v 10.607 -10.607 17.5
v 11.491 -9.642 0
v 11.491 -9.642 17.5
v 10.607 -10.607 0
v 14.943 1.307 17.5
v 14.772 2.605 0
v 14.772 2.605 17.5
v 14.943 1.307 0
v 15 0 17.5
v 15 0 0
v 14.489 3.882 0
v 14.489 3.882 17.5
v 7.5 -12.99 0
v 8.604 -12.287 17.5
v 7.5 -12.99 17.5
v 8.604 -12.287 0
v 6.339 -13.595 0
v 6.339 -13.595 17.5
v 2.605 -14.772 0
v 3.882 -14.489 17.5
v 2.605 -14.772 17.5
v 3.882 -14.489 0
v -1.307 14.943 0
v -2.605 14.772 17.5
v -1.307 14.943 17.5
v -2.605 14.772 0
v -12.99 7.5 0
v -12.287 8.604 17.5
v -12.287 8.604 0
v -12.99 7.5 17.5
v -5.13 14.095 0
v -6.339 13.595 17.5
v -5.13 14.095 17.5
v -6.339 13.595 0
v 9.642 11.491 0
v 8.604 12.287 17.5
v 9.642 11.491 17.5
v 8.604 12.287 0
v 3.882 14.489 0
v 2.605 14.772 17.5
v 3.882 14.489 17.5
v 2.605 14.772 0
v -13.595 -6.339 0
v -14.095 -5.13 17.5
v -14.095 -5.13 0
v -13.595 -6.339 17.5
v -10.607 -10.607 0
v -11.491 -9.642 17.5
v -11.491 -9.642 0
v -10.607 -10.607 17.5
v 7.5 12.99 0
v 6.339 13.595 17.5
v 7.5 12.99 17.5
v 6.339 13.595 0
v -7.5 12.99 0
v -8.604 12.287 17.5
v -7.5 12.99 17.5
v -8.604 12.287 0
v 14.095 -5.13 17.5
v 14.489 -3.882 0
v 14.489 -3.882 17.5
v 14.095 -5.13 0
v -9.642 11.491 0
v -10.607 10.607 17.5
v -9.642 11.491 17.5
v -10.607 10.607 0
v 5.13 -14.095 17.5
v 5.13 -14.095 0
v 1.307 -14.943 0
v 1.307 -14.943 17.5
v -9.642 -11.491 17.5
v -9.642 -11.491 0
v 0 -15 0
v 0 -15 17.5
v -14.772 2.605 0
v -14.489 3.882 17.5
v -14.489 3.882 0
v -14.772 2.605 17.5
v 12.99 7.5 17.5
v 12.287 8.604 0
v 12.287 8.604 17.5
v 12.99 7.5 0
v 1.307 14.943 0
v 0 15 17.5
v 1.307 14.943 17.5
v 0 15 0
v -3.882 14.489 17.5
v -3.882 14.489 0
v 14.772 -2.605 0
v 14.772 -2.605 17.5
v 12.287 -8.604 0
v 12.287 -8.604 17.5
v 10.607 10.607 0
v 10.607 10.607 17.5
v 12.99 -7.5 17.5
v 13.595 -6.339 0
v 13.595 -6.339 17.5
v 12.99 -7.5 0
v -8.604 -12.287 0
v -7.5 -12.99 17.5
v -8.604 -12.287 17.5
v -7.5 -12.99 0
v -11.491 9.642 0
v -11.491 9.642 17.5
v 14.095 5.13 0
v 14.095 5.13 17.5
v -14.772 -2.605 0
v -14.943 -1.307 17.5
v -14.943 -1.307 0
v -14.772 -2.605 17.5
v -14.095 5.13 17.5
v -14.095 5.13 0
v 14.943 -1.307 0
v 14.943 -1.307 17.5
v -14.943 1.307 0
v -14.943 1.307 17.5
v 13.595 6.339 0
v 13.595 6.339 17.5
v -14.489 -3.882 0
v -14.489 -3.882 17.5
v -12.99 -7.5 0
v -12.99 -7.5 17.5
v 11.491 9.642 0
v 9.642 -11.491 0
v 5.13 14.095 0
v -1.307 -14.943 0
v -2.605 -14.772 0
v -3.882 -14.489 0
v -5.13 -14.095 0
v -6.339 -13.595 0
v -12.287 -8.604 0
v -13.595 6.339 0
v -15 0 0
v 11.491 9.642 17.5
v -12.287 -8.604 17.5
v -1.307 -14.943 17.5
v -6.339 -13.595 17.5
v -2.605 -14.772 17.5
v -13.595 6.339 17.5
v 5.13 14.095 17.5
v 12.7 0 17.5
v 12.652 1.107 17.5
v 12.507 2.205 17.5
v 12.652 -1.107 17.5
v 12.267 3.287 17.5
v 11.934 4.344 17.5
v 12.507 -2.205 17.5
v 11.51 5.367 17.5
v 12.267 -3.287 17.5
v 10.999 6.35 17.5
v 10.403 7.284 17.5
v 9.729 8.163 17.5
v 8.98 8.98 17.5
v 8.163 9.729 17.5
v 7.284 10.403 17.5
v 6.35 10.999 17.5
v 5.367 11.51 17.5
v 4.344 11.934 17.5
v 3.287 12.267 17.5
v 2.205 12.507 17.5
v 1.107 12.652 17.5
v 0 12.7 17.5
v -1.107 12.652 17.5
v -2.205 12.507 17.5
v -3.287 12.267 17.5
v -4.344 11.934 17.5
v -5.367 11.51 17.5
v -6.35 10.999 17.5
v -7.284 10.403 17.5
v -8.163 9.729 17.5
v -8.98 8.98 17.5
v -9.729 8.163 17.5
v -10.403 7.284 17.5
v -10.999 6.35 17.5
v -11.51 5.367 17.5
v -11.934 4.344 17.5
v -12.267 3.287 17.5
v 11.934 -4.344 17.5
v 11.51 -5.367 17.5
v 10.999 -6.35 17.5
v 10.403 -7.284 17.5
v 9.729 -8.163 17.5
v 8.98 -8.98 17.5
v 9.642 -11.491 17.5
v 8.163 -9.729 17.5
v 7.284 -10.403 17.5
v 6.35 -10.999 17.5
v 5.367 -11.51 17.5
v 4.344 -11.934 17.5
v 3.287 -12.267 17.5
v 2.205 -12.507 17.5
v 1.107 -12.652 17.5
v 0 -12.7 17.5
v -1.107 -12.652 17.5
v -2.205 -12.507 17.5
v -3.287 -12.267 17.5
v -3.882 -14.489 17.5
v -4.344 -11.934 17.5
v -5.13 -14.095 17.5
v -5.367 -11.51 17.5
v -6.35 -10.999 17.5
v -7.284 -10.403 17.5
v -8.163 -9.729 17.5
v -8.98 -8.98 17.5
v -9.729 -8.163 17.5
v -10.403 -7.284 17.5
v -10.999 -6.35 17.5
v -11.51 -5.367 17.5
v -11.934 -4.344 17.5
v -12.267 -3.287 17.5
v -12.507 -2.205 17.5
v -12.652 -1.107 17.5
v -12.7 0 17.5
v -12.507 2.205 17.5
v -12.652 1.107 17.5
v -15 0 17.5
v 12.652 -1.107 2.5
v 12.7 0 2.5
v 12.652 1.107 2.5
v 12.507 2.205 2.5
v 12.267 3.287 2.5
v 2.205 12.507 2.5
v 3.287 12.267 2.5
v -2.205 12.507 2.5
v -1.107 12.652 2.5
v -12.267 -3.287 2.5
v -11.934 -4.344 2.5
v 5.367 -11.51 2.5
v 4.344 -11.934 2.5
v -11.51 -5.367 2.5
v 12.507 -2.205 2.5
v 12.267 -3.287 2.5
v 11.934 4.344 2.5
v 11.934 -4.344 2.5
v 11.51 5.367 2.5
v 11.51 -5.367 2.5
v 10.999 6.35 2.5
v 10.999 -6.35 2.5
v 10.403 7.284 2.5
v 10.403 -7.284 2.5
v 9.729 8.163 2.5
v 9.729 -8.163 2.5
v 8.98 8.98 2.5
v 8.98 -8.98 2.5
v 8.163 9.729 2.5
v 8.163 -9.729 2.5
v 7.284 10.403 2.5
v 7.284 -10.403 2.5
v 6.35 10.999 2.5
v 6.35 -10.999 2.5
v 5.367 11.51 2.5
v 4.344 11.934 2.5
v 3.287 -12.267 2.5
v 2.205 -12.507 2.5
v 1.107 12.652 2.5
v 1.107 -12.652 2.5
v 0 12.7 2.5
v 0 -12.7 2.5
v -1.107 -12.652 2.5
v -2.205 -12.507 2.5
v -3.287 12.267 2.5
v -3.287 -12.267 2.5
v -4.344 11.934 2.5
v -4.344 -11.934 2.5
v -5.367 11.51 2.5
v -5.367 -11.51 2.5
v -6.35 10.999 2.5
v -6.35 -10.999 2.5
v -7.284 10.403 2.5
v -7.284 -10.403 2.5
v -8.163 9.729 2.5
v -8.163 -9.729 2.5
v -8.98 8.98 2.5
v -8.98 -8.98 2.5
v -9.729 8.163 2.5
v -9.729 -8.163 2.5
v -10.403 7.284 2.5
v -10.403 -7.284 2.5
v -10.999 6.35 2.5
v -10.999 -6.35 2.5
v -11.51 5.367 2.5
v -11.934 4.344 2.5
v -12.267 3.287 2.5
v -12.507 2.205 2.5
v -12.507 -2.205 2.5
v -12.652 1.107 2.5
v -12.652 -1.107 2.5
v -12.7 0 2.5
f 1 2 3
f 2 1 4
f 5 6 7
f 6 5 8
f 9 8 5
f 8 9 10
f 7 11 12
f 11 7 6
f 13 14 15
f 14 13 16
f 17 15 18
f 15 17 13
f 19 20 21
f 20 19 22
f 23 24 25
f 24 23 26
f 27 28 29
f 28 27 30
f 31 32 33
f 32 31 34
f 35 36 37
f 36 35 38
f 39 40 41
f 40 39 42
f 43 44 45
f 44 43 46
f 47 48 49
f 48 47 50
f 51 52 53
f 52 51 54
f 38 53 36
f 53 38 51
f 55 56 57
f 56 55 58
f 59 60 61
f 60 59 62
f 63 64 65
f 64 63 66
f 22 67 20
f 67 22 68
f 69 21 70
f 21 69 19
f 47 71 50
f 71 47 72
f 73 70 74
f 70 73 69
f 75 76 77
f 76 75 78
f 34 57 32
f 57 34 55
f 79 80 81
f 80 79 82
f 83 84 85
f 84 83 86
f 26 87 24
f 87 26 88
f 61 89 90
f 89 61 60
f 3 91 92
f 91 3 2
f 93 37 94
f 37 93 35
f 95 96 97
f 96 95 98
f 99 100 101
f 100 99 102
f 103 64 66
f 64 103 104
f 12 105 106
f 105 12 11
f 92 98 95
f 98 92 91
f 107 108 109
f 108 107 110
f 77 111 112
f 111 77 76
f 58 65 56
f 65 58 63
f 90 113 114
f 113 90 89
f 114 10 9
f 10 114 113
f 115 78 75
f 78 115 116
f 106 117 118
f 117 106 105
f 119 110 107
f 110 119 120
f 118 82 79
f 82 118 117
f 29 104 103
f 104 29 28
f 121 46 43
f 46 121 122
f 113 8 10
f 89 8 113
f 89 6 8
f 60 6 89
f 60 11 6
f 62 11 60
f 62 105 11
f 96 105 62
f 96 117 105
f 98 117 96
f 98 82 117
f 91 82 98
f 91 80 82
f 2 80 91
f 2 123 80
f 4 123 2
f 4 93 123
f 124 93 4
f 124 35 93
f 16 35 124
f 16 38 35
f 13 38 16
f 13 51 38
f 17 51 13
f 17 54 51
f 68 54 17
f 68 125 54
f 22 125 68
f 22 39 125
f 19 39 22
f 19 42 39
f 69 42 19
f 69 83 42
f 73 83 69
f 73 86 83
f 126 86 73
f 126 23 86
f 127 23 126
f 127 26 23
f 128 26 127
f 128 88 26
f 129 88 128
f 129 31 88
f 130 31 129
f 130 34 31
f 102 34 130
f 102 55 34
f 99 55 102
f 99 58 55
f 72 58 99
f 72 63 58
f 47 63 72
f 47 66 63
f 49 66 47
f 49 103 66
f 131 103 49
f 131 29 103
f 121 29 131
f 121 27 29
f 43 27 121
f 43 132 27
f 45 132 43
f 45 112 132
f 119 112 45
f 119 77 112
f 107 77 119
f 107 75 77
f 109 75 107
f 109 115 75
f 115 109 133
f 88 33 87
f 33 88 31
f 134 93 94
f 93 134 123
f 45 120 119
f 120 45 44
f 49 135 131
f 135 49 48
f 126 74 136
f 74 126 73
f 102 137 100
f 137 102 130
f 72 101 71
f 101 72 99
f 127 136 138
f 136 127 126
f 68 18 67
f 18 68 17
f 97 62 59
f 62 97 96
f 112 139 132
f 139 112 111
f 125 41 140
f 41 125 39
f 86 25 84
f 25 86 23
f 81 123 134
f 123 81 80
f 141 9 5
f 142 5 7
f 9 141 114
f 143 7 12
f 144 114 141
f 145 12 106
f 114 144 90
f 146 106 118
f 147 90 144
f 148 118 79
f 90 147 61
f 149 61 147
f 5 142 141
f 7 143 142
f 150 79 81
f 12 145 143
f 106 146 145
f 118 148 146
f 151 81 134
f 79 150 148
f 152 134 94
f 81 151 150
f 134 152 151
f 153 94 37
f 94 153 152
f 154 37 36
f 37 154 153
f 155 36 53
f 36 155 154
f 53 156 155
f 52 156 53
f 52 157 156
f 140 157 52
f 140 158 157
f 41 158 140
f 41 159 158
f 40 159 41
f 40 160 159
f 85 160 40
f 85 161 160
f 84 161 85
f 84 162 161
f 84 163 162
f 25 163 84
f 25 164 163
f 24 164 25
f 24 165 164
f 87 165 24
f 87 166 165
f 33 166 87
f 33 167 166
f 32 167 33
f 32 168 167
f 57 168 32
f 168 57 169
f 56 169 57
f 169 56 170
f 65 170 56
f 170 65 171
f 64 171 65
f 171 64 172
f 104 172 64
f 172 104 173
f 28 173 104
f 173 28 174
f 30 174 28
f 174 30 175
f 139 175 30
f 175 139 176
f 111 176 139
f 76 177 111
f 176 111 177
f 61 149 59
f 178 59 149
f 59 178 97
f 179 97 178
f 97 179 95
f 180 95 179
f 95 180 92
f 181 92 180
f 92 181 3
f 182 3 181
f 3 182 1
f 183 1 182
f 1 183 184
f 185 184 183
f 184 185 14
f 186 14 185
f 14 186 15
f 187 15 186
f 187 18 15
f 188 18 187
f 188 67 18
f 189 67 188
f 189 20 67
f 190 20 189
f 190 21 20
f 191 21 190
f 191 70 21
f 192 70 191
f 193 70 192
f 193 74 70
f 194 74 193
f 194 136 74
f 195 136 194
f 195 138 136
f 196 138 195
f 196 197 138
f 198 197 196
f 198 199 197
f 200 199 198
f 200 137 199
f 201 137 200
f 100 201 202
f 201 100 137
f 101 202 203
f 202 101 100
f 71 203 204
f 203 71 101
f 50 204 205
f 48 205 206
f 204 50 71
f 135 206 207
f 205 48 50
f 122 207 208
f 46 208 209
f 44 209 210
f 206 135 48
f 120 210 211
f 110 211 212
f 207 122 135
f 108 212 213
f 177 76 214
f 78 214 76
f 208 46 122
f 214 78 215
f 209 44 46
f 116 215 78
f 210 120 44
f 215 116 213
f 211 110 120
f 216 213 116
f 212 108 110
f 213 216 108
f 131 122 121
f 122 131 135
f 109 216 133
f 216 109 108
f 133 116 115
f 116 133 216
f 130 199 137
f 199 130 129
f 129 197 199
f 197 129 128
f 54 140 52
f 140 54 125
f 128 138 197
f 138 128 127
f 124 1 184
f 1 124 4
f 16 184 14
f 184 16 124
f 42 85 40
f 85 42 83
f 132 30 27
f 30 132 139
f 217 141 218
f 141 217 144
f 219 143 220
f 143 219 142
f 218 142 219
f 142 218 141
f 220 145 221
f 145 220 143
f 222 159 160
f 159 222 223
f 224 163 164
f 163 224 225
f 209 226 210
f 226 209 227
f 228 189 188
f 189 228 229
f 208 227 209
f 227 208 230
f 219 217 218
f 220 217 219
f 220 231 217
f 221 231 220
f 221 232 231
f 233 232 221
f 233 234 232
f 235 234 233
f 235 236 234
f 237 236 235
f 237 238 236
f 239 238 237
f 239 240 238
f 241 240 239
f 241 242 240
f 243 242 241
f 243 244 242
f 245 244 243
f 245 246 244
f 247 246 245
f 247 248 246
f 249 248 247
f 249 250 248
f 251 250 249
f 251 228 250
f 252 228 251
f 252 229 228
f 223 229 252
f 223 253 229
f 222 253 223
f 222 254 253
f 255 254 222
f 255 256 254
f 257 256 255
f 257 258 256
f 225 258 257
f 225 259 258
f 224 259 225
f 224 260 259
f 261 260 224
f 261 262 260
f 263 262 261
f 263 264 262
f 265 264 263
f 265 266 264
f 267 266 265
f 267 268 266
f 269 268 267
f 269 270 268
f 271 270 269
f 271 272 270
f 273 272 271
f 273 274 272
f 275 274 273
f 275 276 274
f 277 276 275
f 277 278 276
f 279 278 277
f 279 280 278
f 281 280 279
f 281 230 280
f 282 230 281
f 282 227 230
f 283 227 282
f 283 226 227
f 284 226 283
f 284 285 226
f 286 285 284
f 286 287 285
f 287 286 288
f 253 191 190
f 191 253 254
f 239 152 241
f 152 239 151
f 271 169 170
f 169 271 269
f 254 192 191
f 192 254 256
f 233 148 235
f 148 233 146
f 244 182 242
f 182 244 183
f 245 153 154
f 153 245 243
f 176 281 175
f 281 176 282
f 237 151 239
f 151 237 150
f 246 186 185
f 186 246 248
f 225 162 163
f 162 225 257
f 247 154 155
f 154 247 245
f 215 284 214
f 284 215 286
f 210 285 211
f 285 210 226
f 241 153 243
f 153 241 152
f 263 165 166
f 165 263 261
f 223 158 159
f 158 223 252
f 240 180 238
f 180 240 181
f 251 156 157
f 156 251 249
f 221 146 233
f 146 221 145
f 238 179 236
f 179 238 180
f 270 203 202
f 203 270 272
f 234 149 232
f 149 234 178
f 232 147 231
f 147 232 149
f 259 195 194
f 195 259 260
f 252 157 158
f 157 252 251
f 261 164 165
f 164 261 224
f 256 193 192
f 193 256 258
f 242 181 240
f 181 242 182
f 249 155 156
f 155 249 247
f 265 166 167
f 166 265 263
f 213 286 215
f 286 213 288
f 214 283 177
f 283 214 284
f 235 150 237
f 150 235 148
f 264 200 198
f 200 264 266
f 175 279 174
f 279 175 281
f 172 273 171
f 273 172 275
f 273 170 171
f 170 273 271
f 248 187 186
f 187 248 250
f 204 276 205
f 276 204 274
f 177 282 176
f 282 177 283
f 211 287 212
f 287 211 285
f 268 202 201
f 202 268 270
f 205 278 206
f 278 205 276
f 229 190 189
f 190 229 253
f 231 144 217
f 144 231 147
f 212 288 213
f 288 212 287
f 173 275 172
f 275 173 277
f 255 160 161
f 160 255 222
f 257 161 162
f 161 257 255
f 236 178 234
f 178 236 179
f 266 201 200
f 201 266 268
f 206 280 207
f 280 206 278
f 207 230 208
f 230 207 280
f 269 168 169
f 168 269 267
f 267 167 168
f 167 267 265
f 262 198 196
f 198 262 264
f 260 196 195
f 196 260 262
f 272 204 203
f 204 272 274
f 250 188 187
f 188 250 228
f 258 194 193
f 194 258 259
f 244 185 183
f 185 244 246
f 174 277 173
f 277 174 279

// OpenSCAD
// Tube end cap - a cap that fits over the end of a round tube to close or protect it.
// NOVEL general part.
//
// @desc tube end cap that fits over the end of a round tube
// @prompt Design a tube end cap in OpenSCAD: a cap that fits over a {tube_d} mm outer-diameter tube, {depth} mm deep, with {wall} mm walls. Reply with a single complete OpenSCAD file.
// @param tube_d tube outer diameter, mm  [8:50]
// @param depth  cap depth, mm            [6:30]
// @param wall   wall thickness, mm       [1.5:4]

tube_d = 25;
depth  = 15;
wall   = 2.5;

$fn = 72;

difference() {
    cylinder(h = depth + wall, d = tube_d + 2 * wall);          // outer shell
    translate([0, 0, wall]) cylinder(h = depth + 1, d = tube_d + 0.4);   // pocket for the tube (0.2 mm clearance)
}
